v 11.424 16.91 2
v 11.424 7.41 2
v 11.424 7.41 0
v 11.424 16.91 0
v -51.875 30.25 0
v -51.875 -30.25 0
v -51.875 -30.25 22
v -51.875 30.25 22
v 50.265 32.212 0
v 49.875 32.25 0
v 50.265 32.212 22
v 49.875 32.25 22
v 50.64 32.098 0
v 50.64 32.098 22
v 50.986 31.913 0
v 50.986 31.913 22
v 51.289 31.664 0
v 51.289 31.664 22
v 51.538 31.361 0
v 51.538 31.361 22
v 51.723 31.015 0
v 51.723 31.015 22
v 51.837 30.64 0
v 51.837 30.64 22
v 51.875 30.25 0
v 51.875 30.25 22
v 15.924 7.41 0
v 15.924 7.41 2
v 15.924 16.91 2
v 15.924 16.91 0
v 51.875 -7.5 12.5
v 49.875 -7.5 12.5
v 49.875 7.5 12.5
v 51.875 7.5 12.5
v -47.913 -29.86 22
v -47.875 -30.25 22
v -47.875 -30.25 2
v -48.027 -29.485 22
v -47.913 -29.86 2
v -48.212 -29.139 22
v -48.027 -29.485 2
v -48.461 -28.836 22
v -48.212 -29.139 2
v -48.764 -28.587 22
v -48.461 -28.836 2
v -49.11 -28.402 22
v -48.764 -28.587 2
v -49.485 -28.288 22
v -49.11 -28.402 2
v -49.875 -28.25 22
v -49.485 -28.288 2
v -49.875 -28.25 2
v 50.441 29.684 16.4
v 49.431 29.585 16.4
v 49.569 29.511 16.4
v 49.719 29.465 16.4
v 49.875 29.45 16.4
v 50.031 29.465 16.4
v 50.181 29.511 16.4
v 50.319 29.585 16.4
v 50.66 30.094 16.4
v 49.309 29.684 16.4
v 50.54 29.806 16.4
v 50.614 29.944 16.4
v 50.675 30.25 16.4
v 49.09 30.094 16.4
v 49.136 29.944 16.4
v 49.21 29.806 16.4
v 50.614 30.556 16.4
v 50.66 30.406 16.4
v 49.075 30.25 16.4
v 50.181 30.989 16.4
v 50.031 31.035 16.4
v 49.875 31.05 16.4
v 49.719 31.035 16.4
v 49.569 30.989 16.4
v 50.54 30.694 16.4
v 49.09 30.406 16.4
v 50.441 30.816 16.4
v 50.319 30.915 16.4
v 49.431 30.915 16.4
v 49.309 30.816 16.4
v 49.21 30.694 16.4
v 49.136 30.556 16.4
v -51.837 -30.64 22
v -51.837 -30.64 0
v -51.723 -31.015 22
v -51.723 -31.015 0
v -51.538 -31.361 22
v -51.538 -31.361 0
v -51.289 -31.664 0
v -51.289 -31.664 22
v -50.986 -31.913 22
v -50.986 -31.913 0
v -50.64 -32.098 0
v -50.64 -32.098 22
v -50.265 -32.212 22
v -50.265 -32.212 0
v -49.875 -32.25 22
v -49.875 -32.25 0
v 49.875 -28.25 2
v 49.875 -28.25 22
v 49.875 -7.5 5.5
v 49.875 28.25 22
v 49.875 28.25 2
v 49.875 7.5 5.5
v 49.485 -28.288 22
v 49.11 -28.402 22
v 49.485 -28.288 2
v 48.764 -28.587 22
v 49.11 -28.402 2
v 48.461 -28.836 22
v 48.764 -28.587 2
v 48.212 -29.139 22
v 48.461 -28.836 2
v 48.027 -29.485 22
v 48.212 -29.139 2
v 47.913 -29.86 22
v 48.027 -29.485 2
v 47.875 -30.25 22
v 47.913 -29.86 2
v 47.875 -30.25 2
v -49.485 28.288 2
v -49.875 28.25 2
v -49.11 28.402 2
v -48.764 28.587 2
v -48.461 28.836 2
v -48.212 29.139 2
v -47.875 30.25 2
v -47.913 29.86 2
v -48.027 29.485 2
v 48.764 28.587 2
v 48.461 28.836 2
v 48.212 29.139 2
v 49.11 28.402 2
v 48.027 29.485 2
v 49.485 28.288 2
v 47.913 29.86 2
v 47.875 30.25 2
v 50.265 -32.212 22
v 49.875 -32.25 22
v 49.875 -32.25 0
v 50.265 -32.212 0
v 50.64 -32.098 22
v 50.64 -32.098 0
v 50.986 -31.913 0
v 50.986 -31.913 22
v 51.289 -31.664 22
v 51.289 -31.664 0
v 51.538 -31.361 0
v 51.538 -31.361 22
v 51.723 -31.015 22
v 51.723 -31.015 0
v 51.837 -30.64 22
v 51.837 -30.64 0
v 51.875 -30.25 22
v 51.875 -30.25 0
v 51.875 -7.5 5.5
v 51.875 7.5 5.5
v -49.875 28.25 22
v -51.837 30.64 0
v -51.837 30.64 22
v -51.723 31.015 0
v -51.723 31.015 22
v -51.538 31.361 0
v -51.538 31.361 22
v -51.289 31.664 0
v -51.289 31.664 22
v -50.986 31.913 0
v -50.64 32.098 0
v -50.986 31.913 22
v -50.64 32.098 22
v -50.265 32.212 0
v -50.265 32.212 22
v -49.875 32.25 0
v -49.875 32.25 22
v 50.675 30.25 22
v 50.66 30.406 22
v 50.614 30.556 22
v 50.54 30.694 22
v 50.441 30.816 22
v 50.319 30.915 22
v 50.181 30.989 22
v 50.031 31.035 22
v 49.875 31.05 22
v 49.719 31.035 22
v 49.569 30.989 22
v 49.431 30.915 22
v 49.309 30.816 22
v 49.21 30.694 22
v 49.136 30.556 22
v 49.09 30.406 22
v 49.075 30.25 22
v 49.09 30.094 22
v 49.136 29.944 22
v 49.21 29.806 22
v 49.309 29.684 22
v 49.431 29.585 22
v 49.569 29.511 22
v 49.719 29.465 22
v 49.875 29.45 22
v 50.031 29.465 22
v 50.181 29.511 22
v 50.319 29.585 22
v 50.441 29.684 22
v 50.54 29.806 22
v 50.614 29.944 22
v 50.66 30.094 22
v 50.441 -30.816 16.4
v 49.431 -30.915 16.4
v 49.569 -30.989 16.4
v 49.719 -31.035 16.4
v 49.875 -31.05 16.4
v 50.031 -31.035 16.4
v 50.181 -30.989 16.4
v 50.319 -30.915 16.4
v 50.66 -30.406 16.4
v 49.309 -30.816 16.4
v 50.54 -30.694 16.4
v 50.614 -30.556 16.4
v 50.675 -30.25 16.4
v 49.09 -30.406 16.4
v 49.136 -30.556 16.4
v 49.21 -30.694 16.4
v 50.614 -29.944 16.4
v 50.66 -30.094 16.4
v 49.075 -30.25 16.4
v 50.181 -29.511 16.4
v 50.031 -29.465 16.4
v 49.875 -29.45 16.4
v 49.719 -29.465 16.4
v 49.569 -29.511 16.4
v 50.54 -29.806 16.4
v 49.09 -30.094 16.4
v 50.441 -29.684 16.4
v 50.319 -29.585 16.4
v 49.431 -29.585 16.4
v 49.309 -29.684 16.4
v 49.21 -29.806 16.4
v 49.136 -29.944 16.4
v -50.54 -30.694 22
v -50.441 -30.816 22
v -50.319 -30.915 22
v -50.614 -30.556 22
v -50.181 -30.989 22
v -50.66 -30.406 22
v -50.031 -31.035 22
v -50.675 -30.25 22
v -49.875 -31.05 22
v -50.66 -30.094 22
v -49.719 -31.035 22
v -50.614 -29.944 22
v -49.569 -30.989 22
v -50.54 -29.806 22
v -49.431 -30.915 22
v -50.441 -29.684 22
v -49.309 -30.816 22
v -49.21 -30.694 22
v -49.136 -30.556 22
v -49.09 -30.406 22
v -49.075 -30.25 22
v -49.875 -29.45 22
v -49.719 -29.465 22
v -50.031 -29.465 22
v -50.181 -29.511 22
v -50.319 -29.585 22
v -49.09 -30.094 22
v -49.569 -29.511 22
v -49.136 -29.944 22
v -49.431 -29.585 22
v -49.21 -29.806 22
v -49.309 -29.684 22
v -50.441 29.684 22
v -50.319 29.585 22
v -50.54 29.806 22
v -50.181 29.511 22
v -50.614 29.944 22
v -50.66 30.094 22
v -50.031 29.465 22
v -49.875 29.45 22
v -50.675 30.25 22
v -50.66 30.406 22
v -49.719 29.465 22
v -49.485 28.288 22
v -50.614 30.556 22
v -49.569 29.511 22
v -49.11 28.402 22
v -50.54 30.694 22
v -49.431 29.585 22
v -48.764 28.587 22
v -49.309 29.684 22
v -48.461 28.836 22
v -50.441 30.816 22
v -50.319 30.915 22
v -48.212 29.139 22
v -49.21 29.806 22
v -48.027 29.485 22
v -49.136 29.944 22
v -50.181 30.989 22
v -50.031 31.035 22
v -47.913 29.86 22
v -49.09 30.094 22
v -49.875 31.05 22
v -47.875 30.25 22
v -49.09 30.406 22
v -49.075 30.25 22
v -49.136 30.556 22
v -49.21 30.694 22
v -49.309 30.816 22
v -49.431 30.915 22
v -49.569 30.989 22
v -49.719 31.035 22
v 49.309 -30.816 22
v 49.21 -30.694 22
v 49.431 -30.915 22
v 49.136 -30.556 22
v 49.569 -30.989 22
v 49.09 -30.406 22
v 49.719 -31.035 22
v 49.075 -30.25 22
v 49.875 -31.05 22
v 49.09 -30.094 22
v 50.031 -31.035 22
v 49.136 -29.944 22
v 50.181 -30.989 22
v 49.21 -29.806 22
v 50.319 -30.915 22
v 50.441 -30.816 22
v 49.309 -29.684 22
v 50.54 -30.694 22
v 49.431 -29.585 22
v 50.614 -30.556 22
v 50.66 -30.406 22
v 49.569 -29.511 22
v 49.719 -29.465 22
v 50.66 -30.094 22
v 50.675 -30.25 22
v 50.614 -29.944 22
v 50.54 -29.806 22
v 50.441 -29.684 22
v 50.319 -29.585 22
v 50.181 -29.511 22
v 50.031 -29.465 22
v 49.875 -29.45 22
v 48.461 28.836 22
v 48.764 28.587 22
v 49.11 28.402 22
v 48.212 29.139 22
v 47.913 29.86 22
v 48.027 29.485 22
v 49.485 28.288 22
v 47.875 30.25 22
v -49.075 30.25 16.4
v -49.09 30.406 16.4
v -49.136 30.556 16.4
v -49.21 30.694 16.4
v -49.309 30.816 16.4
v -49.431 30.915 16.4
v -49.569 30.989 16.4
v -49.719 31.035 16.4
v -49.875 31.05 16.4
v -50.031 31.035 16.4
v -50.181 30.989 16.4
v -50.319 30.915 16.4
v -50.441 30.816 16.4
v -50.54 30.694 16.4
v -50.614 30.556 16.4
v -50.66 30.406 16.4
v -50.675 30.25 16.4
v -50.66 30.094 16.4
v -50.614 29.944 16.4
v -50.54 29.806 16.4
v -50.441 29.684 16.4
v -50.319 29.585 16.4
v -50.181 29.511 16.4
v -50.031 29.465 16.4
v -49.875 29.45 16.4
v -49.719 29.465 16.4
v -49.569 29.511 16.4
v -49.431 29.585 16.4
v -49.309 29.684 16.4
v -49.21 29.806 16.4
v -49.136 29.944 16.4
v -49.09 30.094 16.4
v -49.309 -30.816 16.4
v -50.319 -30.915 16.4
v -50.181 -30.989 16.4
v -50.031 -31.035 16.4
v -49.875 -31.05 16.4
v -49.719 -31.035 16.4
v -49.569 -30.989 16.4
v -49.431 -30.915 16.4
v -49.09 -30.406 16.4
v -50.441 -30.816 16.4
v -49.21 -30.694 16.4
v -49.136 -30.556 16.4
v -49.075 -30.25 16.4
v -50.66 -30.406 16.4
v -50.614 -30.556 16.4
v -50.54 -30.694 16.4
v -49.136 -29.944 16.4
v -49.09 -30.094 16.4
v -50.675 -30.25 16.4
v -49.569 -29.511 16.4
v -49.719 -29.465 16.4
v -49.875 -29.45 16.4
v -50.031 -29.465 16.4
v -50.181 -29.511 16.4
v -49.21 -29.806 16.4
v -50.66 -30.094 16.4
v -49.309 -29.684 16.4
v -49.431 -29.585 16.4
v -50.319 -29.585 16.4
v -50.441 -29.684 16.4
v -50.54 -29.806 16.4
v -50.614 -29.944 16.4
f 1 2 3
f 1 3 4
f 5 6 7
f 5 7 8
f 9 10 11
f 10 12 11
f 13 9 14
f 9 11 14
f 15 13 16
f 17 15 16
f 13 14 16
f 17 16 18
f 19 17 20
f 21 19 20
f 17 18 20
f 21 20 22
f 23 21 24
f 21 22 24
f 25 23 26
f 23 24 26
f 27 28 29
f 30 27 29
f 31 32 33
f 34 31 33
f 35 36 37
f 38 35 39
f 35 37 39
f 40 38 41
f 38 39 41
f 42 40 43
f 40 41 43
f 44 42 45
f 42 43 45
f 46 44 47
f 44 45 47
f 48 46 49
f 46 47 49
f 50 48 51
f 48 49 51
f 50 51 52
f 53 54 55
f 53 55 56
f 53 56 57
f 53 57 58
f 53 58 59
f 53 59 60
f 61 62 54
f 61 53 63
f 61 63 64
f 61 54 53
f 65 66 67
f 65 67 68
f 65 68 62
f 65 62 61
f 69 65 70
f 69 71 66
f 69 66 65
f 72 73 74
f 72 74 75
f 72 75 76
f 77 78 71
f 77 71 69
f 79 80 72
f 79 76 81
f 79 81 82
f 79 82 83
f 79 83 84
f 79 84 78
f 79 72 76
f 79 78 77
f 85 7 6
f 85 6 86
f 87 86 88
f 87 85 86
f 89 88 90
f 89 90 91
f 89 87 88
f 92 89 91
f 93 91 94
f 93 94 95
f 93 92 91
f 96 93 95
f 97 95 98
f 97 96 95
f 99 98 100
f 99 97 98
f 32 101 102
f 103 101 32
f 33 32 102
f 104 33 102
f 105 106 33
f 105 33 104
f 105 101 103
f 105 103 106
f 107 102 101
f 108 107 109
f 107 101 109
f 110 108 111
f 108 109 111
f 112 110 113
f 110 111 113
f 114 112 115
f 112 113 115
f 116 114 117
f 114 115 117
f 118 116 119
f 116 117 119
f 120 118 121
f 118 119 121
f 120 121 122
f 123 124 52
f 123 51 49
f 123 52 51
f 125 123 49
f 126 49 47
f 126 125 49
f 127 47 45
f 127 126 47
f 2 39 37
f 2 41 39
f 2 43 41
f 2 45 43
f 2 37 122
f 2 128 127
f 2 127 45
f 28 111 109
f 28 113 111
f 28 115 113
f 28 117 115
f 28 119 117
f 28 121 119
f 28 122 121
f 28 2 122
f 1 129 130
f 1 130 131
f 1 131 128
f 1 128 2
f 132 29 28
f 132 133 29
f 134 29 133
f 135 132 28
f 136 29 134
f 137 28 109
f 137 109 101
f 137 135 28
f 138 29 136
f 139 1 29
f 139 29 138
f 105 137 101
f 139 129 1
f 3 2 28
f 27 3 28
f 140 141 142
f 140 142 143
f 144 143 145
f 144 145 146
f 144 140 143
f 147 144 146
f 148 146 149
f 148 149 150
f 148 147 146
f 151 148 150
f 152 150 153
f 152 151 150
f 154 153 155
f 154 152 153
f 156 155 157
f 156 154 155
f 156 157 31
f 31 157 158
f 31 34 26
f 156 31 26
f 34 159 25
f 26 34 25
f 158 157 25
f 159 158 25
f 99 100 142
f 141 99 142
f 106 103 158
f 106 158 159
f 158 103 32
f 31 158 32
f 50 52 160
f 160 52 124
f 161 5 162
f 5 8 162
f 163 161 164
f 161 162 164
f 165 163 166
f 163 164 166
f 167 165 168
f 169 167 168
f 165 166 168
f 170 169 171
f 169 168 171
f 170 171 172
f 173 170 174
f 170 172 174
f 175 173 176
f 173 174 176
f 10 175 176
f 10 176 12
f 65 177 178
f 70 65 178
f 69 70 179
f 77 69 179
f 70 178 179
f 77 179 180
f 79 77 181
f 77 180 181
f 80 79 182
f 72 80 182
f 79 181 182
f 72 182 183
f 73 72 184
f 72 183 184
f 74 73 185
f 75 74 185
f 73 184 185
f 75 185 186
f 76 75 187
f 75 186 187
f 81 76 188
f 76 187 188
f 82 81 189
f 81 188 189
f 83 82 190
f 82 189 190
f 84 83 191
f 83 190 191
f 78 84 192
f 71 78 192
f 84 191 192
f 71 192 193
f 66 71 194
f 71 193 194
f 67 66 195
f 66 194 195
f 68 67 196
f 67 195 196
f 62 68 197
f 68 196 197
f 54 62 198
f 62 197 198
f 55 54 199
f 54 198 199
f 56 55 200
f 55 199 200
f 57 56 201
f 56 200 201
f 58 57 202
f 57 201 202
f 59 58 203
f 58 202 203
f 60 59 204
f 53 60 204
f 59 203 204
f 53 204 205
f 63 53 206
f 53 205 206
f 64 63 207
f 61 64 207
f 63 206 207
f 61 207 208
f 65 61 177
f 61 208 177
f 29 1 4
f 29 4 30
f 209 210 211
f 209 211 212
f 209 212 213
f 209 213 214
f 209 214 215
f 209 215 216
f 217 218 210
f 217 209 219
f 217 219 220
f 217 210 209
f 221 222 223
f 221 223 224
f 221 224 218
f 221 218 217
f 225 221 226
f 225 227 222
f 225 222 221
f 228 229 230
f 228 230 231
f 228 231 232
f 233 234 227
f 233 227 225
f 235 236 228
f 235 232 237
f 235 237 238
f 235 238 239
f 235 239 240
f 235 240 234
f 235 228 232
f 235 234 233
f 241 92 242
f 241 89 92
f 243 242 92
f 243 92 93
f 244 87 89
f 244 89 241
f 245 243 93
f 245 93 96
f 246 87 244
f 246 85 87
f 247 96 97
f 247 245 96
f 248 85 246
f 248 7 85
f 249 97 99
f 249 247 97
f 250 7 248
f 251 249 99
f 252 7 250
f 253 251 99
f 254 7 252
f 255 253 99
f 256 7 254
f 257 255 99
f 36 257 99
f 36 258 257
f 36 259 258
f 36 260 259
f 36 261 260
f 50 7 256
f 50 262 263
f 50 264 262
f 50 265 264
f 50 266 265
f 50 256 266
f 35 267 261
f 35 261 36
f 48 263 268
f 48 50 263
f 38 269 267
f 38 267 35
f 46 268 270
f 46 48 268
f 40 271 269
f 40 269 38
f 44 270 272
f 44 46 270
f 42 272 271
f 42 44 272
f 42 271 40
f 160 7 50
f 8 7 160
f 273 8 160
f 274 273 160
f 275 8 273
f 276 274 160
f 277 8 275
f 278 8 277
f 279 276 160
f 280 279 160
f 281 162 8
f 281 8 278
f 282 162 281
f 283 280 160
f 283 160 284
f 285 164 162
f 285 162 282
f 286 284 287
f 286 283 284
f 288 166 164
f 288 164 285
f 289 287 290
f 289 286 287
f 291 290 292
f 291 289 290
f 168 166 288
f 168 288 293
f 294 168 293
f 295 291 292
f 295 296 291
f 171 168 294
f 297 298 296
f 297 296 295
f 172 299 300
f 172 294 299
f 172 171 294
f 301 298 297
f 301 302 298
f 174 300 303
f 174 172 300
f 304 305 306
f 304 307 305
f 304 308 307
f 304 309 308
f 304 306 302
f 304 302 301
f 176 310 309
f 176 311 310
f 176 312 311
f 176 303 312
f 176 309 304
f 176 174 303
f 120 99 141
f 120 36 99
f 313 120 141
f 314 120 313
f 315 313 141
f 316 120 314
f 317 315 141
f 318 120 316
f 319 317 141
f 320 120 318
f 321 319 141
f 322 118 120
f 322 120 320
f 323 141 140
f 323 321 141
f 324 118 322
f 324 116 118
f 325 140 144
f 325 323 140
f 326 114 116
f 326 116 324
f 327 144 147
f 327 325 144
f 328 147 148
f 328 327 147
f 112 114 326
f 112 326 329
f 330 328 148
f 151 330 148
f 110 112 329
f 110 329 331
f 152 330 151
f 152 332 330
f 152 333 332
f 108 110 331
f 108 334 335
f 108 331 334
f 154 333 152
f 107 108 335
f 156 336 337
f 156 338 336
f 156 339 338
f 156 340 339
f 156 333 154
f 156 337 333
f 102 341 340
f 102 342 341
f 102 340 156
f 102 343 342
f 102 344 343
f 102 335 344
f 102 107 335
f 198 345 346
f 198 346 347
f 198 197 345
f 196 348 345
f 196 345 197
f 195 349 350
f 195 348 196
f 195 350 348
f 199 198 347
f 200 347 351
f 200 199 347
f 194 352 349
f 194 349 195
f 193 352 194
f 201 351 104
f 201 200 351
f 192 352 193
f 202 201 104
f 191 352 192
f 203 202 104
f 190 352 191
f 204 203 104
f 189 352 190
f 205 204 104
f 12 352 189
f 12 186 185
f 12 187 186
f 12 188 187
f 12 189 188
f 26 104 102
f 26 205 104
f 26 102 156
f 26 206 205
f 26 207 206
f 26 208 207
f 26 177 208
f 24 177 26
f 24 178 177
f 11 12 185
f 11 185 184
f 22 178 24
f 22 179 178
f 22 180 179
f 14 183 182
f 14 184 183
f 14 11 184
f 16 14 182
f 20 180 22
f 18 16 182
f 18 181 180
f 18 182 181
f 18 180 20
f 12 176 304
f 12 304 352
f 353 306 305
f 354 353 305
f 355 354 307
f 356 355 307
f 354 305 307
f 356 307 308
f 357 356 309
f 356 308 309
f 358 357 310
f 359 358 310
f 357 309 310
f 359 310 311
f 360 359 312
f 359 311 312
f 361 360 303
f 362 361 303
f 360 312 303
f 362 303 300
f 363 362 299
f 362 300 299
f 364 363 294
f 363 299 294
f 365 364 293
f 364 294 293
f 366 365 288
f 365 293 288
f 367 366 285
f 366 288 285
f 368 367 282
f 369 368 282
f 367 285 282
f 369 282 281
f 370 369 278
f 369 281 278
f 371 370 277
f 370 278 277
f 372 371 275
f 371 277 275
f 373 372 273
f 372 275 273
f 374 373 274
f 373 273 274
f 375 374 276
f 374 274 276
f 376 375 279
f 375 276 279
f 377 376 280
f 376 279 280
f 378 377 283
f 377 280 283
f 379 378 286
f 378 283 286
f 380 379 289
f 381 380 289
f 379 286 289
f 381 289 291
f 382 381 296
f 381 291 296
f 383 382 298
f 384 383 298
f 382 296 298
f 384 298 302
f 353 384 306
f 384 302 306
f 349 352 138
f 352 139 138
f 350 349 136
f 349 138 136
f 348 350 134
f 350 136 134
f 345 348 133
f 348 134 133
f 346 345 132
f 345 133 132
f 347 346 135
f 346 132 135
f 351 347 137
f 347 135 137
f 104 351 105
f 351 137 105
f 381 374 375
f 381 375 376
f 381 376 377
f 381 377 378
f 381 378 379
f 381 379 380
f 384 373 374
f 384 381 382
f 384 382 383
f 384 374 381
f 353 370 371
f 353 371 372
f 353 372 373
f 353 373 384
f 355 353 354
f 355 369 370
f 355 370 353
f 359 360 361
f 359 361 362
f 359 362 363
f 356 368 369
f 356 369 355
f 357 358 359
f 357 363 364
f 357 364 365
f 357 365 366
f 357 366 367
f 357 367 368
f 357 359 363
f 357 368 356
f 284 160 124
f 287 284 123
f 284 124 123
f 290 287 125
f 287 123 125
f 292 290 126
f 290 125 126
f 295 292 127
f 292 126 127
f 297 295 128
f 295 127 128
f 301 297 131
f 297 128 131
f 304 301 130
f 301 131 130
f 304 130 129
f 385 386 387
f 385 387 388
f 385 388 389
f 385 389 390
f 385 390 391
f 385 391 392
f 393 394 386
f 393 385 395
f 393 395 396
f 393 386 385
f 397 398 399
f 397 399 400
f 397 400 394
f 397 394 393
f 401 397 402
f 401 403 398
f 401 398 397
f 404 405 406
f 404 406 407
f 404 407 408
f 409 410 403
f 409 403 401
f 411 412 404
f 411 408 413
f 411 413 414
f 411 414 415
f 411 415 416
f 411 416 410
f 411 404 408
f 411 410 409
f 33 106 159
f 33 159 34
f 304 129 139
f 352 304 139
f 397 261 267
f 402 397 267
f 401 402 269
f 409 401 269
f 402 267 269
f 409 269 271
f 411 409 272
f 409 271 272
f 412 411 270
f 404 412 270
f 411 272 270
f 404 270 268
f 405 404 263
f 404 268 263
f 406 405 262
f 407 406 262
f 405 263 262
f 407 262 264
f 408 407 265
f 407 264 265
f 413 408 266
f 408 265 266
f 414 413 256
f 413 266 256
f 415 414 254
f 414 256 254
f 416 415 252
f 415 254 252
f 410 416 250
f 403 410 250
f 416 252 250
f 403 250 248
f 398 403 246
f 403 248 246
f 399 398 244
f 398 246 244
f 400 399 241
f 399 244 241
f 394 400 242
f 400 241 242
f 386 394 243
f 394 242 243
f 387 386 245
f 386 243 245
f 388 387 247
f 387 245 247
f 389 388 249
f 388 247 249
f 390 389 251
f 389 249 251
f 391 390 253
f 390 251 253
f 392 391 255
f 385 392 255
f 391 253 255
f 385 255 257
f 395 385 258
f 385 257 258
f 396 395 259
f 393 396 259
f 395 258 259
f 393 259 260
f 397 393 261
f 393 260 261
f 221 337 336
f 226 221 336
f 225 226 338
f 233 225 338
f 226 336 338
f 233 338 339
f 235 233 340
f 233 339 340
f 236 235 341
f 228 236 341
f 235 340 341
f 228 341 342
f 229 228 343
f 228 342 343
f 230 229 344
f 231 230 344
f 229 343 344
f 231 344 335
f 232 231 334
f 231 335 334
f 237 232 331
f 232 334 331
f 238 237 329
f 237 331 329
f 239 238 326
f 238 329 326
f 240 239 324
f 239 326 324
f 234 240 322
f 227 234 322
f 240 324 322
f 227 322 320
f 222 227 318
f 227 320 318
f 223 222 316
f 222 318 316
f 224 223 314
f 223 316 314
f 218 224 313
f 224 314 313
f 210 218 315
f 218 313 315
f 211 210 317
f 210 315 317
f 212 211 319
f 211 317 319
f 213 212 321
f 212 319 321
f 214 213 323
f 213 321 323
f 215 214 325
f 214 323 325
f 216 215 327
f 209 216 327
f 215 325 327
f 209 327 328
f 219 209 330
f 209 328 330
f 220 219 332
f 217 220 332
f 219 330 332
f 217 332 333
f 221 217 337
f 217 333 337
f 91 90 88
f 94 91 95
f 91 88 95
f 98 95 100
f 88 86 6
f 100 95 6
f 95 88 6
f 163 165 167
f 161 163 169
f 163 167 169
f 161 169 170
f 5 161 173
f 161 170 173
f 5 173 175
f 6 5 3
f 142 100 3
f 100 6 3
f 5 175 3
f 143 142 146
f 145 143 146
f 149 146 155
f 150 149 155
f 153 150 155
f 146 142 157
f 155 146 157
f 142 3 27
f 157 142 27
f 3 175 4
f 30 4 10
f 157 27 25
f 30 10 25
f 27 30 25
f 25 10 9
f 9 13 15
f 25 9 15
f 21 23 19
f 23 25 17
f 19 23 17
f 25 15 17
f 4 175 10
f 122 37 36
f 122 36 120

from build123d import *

# Parameters (mm, degrees)
F0_W      = 103.75
F0_H      = 64.5
F1_DEPTH  = 22
F2_T      = -2
F3_W      = 15
F3_H      = 7
F4_DEPTH  = 381
F5_R      = 2
F6_W      = 4.5
F6_H      = 9.5
F7_DEPTH  = 12.7
F8_R      = 2
F9_DEPTH  = 22
F10_R     = 2
F11_DEPTH = 20
F12_R     = 2
F13_DEPTH = 20
F14_R     = 2
F15_DEPTH = 22
F16_R     = 0.8
F17_DEPTH = 5.6
F18_R     = 0.8
F19_DEPTH = 5.6
F20_R     = 0.8
F21_DEPTH = 5.6
F22_R     = 0.8
F23_DEPTH = 5.6


with BuildPart() as f1:
    # F0 (on Top) → F1 (new body)
    with BuildSketch(Plane.XY):
        Rectangle(F0_W, F0_H)
    extrude(amount=F1_DEPTH)

    # F2
    f2_openings = [f1.faces().sort_by_distance(p)[0] for p in [
        (0, 0, 22),
    ]]
    offset(amount=F2_T, openings=f2_openings)

    # F3 (on Right) → F4 (cut)
    with BuildSketch(Plane.YZ):
        with Locations((0, 9)):
            Rectangle(F3_W, F3_H)
    extrude(amount=F4_DEPTH, mode=Mode.SUBTRACT)

    # F5
    f5_edges = [f1.edges().sort_by_distance(p)[0] for p in [
        (-51.875, 32.25, 11),
        (-51.875, -32.25, 11),
        (51.875, -32.25, 11),
        (51.875, 32.25, 11),
    ]]
    fillet(f5_edges, radius=F5_R)

    # F6 (on Top) → F7 (cut, symmetric)
    with BuildSketch(Plane.XY):
        with Locations((13.673813, 12.159993)):
            Rectangle(F6_W, F6_H)
    extrude(amount=F7_DEPTH, both=True, mode=Mode.SUBTRACT)

    # F8 (on Top) → F9 (join)
    with BuildSketch(Plane.XY):
        with Locations((-49.875, 30.25)):
            Circle(F8_R)
    extrude(amount=F9_DEPTH)

    # F10 (on face) → F11 (join)
    with BuildSketch(Plane.XY.offset(2)):
        with Locations((-49.875, -30.25)):
            Circle(F10_R)
    extrude(amount=F11_DEPTH)

    # F12 (on face) → F13 (join)
    with BuildSketch(Plane.XY.offset(2)):
        with Locations((49.875, -30.25)):
            Circle(F12_R)
    extrude(amount=F13_DEPTH)

    # F14 (on Top) → F15 (join)
    with BuildSketch(Plane.XY):
        with Locations((49.875, 30.25)):
            Circle(F14_R)
    extrude(amount=F15_DEPTH)

    # F16 (on face) → F17 (cut)
    with BuildSketch(Plane.XY.offset(22)):
        with Locations((-49.875, 30.25)):
            Circle(F16_R)
    extrude(amount=-F17_DEPTH, mode=Mode.SUBTRACT)

    # F18 (on face) → F19 (cut)
    with BuildSketch(Plane.XY.offset(22)):
        with Locations((-49.875, -30.25)):
            Circle(F18_R)
    extrude(amount=-F19_DEPTH, mode=Mode.SUBTRACT)

    # F20 (on face) → F21 (cut)
    with BuildSketch(Plane.XY.offset(22)):
        with Locations((49.875, -30.25)):
            Circle(F20_R)
    extrude(amount=-F21_DEPTH, mode=Mode.SUBTRACT)

    # F22 (on face) → F23 (cut)
    with BuildSketch(Plane.XY.offset(22)):
        with Locations((49.875, 30.25)):
            Circle(F22_R)
    extrude(amount=-F23_DEPTH, mode=Mode.SUBTRACT)


solid = f1.part
